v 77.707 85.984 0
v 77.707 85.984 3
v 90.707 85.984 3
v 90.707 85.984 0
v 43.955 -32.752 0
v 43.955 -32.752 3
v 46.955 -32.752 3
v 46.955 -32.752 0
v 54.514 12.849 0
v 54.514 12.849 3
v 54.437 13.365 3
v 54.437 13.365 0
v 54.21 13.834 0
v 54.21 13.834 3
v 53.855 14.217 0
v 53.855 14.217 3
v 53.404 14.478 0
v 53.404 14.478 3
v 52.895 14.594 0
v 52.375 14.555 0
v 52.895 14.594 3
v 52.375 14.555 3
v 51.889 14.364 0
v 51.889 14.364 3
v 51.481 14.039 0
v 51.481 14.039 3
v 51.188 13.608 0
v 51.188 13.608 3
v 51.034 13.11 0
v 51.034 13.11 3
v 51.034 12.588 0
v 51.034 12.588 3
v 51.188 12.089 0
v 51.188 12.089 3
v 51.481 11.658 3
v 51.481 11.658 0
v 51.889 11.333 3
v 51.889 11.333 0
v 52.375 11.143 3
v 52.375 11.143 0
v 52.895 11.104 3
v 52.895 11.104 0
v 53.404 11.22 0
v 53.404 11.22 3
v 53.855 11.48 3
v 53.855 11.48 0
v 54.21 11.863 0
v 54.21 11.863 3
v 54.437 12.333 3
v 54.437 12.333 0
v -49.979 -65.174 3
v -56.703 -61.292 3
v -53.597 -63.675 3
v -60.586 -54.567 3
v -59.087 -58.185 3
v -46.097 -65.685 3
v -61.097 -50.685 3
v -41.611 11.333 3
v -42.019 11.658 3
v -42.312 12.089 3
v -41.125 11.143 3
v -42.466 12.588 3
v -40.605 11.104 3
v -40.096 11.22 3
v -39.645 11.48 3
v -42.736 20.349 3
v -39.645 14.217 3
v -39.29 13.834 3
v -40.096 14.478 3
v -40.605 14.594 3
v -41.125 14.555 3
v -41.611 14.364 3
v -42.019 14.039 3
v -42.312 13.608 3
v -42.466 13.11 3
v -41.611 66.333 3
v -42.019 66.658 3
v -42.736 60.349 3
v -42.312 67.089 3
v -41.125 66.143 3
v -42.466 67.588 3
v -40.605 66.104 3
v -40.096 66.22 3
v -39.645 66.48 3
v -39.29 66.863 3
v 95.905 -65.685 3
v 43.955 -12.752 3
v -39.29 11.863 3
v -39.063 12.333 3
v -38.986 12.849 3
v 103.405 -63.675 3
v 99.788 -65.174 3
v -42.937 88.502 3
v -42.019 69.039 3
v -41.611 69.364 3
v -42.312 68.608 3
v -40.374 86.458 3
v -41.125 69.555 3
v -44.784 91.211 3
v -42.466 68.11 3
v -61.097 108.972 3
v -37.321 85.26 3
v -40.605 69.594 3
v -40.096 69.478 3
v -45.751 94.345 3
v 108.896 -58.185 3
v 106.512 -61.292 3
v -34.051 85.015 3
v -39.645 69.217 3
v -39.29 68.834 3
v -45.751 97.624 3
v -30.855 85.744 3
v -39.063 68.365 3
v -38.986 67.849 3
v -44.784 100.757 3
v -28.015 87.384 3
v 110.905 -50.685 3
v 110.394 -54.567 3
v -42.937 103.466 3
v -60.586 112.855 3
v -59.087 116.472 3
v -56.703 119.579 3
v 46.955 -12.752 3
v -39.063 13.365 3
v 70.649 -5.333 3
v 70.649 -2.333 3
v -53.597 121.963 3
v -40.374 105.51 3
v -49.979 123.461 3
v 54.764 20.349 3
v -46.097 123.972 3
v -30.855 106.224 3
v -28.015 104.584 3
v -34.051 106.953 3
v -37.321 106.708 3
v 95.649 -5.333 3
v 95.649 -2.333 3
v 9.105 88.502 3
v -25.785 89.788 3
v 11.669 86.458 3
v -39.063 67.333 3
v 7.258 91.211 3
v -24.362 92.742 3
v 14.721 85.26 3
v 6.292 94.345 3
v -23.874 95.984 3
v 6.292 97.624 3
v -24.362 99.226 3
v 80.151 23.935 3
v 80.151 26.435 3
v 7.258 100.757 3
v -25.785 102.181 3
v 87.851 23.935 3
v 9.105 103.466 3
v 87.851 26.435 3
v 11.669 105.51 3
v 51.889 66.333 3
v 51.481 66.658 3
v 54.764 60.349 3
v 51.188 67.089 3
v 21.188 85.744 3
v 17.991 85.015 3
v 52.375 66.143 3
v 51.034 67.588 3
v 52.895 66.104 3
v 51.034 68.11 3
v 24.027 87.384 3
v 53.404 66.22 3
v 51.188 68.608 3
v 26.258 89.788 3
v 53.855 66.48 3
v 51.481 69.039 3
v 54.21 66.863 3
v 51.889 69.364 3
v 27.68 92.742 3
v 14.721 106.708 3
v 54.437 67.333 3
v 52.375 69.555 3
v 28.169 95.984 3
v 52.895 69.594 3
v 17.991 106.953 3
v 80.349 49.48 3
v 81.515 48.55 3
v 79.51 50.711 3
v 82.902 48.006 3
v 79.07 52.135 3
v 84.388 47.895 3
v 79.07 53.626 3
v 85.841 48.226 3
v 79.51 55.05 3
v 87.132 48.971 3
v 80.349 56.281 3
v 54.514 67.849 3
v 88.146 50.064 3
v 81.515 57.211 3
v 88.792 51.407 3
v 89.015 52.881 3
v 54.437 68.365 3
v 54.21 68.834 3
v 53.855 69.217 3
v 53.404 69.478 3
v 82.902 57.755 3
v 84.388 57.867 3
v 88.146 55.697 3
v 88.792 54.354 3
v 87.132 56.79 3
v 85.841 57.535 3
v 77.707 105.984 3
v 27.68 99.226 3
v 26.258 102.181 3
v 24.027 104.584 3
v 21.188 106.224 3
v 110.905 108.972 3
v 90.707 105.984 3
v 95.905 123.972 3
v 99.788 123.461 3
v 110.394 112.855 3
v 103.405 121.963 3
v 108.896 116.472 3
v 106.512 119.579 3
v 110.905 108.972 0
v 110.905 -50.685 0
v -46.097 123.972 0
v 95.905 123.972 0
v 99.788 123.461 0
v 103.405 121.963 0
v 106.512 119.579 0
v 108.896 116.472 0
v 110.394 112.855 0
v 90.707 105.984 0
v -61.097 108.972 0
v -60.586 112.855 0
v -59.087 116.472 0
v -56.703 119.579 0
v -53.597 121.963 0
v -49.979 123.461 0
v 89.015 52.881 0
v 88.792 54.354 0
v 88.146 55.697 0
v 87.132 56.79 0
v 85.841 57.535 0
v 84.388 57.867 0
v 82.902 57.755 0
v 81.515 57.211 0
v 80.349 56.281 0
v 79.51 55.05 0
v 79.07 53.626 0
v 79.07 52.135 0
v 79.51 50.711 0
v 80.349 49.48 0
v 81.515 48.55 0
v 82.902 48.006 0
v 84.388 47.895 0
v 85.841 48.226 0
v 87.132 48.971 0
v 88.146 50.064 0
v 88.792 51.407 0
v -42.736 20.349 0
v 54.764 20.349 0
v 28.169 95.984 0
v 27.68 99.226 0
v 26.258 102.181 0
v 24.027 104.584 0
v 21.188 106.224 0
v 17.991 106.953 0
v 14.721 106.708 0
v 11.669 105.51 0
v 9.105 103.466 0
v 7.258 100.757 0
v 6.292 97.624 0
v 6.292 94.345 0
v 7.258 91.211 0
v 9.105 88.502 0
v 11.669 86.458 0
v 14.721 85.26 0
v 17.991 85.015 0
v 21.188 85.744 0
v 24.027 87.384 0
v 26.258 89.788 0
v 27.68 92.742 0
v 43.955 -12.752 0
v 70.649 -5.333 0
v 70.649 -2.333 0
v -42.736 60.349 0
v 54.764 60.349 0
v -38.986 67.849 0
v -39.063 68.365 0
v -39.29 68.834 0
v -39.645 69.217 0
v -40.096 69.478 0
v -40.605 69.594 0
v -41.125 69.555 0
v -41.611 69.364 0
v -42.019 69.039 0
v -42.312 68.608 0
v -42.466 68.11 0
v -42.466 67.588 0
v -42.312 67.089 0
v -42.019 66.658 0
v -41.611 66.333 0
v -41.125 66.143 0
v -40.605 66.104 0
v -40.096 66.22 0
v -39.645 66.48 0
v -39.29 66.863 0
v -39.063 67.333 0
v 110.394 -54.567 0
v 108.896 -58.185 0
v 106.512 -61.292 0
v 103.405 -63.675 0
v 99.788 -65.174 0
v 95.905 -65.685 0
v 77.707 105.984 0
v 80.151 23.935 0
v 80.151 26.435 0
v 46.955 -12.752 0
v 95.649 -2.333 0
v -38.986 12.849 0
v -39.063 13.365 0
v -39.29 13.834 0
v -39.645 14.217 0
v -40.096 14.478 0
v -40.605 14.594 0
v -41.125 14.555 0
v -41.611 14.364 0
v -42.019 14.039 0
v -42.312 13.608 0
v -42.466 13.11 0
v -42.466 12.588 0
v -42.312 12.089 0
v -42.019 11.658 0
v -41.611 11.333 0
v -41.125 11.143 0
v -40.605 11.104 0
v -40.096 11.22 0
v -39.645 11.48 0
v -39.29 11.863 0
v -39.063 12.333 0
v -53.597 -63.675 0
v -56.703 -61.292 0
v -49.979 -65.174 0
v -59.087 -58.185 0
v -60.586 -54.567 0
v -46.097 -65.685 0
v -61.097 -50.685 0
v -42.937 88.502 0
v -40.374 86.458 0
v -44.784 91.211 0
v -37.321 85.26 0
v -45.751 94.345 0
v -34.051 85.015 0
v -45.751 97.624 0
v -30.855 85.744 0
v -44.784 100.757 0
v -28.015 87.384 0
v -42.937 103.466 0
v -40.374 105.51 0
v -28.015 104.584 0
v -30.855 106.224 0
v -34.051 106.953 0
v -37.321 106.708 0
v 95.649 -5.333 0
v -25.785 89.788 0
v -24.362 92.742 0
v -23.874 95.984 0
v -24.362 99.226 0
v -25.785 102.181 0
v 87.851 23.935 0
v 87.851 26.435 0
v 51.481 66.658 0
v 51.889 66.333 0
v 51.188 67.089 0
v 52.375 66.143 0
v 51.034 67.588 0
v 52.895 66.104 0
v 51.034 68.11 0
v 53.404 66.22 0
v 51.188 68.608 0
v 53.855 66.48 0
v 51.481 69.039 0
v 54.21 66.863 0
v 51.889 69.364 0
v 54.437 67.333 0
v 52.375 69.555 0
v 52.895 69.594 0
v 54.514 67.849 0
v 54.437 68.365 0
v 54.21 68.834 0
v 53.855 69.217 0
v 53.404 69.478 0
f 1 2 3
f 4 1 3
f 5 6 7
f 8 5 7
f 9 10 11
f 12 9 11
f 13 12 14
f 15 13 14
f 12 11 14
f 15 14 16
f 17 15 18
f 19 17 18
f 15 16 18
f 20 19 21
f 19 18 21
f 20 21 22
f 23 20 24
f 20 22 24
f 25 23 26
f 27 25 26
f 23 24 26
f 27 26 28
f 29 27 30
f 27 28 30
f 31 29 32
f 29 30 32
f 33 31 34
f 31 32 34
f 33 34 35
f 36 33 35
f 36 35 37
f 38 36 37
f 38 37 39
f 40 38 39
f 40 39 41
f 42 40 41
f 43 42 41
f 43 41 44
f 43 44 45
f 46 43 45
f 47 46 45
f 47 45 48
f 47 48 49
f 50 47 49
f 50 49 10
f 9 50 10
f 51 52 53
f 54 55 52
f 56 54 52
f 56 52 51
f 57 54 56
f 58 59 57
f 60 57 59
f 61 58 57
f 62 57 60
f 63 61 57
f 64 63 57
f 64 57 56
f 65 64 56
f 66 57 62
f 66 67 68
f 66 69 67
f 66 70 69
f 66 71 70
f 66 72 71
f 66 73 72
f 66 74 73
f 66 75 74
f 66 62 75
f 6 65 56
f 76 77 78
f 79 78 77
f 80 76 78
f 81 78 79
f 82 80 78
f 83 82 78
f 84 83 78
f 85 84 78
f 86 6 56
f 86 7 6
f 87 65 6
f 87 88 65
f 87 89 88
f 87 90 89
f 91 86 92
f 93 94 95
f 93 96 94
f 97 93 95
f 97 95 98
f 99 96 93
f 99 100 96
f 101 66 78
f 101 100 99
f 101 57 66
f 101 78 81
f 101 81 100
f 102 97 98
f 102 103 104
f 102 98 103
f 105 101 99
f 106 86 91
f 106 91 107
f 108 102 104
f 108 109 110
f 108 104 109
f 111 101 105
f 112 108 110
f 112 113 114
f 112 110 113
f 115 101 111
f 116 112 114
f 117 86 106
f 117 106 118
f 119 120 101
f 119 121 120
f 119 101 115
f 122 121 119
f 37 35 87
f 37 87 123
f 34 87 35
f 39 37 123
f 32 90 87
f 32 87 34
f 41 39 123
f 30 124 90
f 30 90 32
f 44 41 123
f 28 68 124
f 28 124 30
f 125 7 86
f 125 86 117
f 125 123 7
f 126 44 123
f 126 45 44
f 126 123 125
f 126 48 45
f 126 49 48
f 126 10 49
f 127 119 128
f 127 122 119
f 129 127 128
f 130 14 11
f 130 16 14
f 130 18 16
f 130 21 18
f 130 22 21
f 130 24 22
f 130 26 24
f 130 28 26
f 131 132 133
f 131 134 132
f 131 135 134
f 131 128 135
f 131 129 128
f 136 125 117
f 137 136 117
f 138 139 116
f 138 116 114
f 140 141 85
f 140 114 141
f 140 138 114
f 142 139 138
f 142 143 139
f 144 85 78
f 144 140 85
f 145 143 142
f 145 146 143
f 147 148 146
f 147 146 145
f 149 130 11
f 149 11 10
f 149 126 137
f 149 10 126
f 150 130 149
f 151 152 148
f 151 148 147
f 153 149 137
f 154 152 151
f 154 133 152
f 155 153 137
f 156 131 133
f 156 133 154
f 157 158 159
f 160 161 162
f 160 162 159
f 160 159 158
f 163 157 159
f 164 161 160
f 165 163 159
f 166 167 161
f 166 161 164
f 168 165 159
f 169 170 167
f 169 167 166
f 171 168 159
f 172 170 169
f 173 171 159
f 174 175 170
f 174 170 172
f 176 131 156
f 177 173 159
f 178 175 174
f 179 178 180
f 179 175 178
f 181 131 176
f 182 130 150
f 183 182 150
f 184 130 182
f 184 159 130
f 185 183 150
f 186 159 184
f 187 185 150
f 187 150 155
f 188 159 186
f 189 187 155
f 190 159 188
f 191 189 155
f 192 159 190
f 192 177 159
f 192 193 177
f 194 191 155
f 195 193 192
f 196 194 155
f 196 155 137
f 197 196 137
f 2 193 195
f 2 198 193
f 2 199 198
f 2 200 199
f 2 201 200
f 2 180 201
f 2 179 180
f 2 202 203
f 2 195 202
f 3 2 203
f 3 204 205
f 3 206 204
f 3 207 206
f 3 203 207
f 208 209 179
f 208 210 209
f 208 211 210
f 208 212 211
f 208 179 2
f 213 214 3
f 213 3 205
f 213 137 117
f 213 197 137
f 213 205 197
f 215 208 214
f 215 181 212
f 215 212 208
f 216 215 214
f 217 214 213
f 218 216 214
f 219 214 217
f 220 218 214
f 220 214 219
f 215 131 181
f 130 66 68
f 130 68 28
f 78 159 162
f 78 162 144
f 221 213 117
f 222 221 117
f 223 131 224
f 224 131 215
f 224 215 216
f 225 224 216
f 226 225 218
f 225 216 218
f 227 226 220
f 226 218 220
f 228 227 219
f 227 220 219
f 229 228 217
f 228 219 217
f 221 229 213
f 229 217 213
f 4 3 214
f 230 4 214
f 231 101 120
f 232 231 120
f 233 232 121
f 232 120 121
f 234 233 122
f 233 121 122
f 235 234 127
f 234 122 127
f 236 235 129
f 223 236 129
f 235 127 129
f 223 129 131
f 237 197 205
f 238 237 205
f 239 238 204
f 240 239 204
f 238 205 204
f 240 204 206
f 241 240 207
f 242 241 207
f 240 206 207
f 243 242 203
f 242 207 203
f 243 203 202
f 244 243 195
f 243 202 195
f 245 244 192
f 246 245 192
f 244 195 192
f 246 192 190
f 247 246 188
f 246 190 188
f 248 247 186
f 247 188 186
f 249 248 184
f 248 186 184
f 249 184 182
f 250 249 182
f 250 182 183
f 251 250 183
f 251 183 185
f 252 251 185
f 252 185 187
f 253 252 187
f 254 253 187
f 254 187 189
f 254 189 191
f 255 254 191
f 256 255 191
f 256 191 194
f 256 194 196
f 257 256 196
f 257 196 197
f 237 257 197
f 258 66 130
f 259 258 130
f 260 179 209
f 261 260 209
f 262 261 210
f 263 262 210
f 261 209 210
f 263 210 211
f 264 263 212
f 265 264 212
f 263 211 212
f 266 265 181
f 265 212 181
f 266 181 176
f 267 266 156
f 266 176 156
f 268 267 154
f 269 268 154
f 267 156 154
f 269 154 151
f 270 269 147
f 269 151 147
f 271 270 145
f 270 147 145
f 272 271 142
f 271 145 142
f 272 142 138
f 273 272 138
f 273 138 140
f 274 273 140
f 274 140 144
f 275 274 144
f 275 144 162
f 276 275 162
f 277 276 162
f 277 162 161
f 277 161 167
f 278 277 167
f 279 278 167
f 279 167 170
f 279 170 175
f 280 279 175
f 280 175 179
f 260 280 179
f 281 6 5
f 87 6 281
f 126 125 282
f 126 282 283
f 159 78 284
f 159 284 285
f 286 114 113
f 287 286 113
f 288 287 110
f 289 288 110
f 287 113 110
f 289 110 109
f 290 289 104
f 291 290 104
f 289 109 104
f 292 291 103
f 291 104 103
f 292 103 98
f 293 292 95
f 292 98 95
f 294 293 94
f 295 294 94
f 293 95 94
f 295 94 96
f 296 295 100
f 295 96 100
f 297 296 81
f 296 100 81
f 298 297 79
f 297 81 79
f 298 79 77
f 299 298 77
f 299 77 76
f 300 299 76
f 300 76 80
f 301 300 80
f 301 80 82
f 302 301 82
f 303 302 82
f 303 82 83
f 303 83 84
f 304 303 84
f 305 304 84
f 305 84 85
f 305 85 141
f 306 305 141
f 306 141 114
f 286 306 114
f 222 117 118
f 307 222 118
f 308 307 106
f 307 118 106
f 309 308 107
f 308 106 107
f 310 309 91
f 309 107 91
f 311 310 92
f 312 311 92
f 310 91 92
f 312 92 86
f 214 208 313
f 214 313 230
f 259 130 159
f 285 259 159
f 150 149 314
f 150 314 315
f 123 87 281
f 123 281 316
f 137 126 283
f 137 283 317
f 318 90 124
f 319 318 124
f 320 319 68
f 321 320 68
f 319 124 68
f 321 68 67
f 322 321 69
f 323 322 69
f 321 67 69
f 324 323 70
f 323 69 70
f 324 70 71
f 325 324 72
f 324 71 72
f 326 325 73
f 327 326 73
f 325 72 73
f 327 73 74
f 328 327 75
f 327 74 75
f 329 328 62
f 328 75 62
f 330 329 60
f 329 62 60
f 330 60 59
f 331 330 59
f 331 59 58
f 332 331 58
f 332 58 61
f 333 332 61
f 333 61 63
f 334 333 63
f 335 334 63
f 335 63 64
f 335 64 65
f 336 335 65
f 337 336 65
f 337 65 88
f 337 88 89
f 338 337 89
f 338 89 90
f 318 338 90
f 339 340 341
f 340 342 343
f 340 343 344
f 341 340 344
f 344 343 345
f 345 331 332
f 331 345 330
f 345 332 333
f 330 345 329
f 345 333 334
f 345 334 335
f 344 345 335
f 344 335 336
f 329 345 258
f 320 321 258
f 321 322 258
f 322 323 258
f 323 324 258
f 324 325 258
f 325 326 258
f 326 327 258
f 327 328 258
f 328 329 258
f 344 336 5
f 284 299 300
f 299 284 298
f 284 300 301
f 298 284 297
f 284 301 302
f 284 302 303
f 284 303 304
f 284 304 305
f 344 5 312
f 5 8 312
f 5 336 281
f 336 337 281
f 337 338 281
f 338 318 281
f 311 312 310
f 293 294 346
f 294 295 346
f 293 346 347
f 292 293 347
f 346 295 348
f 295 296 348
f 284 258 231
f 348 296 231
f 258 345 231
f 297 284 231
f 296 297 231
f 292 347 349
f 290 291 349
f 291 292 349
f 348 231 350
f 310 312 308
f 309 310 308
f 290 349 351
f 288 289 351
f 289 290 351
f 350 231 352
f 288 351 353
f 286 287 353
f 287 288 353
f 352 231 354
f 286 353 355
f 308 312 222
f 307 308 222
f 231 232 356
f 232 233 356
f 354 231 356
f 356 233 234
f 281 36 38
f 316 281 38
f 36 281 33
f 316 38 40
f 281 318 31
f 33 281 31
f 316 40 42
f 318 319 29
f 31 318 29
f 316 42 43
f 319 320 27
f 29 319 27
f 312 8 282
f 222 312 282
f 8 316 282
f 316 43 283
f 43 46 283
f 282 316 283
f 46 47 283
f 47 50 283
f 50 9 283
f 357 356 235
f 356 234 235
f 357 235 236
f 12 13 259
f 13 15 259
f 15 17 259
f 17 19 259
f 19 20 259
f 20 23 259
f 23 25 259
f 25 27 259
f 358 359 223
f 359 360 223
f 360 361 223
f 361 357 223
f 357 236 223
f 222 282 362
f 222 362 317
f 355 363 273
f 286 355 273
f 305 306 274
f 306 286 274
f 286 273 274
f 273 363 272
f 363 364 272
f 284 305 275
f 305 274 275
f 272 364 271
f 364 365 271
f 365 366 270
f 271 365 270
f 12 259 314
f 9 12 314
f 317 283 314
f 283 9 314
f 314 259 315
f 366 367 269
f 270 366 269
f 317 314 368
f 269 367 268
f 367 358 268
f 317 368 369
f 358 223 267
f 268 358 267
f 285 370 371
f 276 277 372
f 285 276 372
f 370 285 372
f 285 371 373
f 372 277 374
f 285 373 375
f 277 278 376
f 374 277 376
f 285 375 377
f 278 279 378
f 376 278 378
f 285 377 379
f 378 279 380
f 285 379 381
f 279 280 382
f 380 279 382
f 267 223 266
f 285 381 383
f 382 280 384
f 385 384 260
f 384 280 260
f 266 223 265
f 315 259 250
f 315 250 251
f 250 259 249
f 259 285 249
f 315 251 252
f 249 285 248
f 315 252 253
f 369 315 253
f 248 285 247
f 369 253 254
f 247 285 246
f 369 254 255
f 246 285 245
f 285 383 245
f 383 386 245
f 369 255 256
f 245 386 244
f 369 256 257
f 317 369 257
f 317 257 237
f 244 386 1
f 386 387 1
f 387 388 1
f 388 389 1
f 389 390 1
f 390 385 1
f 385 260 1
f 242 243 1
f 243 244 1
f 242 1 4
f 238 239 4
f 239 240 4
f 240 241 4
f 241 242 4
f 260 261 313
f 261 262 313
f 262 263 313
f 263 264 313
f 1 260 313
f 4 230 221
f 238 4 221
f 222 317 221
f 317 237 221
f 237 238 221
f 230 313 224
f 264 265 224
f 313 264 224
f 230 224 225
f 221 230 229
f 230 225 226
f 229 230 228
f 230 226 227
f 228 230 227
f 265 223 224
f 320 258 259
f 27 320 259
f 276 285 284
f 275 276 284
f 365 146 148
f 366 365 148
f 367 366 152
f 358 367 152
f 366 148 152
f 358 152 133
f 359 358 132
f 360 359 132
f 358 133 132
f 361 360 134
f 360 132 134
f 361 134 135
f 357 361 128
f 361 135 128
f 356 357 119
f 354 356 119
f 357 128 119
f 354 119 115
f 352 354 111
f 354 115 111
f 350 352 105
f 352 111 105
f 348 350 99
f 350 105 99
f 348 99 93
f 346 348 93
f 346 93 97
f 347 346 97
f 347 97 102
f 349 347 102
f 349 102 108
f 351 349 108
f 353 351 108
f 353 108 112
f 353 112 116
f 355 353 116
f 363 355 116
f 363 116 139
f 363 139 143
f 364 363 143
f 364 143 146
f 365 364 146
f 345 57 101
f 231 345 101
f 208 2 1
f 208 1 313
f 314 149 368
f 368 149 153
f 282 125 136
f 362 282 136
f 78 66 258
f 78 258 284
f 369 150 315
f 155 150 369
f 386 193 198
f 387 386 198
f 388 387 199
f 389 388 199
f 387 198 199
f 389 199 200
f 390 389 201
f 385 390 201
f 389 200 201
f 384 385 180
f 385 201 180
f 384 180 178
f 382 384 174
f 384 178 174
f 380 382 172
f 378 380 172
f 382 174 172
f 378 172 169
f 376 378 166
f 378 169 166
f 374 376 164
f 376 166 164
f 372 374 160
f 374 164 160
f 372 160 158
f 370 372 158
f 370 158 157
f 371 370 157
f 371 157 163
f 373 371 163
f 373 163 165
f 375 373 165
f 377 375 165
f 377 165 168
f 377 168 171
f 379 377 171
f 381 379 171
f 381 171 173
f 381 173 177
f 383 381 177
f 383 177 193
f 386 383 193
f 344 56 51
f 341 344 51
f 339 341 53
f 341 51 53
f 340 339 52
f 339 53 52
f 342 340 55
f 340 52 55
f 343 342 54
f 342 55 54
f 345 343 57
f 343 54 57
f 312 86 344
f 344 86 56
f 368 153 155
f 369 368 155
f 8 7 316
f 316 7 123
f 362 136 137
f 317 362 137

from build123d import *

# Parameters (mm, degrees)
F0_W     = 249
F0_H     = 271
F0_W_2   = 227
F0_H_2   = 249
F1_DEPTH = 3
F2_W     = 97.5
F2_H     = 40
F2_R     = 11
F2_R_2   = 1.75
F2_W_2   = 3
F2_H_2   = 20
F2_W_3   = 13
F2_W_4   = 25
F2_H_3   = 3
F2_R_3   = 5
F2_W_5   = 7.7
F2_H_4   = 2.5
F3_DEPTH = 25
F4_W     = 249
F4_H     = 271
F5_DEPTH = 3


with BuildPart() as f1:
    # F0 (on Top) → F1 (new body)
    with BuildSketch(Plane.XY):
        Rectangle(F0_W, F0_H)
        Rectangle(F0_W_2, F0_H_2, mode=Mode.SUBTRACT)
        Rectangle(F0_W_2, F0_H_2)
    extrude(amount=F1_DEPTH)

    # F2 (on face) → F3 (cut)
    with BuildSketch(Plane.XY.offset(3)):
        with Locations((6.014311, 40.348687)):
            Rectangle(F2_W, F2_H)
        with Locations((-34.873512, 95.984109)):
            Circle(F2_R)
        with Locations((17.168977, 95.984109)):
            Circle(F2_R)
        with Locations((-40.735689, 67.848687)):
            Circle(F2_R_2)
        with Locations((52.764311, 67.848687)):
            Circle(F2_R_2)
        with Locations((52.764311, 12.848687)):
            Circle(F2_R_2)
        with Locations((-40.735689, 12.848687)):
            Circle(F2_R_2)
        with Locations((45.454934, -22.752056)):
            Rectangle(F2_W_2, F2_H_2)
        with Locations((84.206969, 95.984109)):
            Rectangle(F2_W_3, F2_H_2)
        with Locations((83.148815, -3.833046)):
            Rectangle(F2_W_4, F2_H_3)
        with Locations((84.014516, 52.88054)):
            Circle(F2_R_3)
        with Locations((84.000645, 25.185113)):
            Rectangle(F2_W_5, F2_H_4)
    extrude(amount=-F3_DEPTH, mode=Mode.SUBTRACT)

    # F4 (on face) → F5 (cut, through all)
    with BuildSketch(Plane.XY.offset(3)):
        Rectangle(F4_W, F4_H)
        with BuildLine():
            ThreePointArc((-61.096646, 108.972366), (-56.703248, 119.578968), (-46.096646, 123.972366))
            Line((-46.096646, 123.972366), (95.905387, 123.972366))
            ThreePointArc((95.905387, 123.972366), (106.511988, 119.578968), (110.905387, 108.972366))
            Line((110.905387, 108.972366), (110.905387, -50.685034))
            ThreePointArc((110.905387, -50.685034), (106.511988, -61.291636), (95.905387, -65.685034))
            Line((95.905387, -65.685034), (-46.096646, -65.685034))
            ThreePointArc((-46.096646, -65.685034), (-56.703248, -61.291636), (-61.096646, -50.685034))
            Line((-61.096646, -50.685034), (-61.096646, 108.972366))
        make_face(mode=Mode.SUBTRACT)
    extrude(amount=-F5_DEPTH, mode=Mode.SUBTRACT)


solid = f1.part
